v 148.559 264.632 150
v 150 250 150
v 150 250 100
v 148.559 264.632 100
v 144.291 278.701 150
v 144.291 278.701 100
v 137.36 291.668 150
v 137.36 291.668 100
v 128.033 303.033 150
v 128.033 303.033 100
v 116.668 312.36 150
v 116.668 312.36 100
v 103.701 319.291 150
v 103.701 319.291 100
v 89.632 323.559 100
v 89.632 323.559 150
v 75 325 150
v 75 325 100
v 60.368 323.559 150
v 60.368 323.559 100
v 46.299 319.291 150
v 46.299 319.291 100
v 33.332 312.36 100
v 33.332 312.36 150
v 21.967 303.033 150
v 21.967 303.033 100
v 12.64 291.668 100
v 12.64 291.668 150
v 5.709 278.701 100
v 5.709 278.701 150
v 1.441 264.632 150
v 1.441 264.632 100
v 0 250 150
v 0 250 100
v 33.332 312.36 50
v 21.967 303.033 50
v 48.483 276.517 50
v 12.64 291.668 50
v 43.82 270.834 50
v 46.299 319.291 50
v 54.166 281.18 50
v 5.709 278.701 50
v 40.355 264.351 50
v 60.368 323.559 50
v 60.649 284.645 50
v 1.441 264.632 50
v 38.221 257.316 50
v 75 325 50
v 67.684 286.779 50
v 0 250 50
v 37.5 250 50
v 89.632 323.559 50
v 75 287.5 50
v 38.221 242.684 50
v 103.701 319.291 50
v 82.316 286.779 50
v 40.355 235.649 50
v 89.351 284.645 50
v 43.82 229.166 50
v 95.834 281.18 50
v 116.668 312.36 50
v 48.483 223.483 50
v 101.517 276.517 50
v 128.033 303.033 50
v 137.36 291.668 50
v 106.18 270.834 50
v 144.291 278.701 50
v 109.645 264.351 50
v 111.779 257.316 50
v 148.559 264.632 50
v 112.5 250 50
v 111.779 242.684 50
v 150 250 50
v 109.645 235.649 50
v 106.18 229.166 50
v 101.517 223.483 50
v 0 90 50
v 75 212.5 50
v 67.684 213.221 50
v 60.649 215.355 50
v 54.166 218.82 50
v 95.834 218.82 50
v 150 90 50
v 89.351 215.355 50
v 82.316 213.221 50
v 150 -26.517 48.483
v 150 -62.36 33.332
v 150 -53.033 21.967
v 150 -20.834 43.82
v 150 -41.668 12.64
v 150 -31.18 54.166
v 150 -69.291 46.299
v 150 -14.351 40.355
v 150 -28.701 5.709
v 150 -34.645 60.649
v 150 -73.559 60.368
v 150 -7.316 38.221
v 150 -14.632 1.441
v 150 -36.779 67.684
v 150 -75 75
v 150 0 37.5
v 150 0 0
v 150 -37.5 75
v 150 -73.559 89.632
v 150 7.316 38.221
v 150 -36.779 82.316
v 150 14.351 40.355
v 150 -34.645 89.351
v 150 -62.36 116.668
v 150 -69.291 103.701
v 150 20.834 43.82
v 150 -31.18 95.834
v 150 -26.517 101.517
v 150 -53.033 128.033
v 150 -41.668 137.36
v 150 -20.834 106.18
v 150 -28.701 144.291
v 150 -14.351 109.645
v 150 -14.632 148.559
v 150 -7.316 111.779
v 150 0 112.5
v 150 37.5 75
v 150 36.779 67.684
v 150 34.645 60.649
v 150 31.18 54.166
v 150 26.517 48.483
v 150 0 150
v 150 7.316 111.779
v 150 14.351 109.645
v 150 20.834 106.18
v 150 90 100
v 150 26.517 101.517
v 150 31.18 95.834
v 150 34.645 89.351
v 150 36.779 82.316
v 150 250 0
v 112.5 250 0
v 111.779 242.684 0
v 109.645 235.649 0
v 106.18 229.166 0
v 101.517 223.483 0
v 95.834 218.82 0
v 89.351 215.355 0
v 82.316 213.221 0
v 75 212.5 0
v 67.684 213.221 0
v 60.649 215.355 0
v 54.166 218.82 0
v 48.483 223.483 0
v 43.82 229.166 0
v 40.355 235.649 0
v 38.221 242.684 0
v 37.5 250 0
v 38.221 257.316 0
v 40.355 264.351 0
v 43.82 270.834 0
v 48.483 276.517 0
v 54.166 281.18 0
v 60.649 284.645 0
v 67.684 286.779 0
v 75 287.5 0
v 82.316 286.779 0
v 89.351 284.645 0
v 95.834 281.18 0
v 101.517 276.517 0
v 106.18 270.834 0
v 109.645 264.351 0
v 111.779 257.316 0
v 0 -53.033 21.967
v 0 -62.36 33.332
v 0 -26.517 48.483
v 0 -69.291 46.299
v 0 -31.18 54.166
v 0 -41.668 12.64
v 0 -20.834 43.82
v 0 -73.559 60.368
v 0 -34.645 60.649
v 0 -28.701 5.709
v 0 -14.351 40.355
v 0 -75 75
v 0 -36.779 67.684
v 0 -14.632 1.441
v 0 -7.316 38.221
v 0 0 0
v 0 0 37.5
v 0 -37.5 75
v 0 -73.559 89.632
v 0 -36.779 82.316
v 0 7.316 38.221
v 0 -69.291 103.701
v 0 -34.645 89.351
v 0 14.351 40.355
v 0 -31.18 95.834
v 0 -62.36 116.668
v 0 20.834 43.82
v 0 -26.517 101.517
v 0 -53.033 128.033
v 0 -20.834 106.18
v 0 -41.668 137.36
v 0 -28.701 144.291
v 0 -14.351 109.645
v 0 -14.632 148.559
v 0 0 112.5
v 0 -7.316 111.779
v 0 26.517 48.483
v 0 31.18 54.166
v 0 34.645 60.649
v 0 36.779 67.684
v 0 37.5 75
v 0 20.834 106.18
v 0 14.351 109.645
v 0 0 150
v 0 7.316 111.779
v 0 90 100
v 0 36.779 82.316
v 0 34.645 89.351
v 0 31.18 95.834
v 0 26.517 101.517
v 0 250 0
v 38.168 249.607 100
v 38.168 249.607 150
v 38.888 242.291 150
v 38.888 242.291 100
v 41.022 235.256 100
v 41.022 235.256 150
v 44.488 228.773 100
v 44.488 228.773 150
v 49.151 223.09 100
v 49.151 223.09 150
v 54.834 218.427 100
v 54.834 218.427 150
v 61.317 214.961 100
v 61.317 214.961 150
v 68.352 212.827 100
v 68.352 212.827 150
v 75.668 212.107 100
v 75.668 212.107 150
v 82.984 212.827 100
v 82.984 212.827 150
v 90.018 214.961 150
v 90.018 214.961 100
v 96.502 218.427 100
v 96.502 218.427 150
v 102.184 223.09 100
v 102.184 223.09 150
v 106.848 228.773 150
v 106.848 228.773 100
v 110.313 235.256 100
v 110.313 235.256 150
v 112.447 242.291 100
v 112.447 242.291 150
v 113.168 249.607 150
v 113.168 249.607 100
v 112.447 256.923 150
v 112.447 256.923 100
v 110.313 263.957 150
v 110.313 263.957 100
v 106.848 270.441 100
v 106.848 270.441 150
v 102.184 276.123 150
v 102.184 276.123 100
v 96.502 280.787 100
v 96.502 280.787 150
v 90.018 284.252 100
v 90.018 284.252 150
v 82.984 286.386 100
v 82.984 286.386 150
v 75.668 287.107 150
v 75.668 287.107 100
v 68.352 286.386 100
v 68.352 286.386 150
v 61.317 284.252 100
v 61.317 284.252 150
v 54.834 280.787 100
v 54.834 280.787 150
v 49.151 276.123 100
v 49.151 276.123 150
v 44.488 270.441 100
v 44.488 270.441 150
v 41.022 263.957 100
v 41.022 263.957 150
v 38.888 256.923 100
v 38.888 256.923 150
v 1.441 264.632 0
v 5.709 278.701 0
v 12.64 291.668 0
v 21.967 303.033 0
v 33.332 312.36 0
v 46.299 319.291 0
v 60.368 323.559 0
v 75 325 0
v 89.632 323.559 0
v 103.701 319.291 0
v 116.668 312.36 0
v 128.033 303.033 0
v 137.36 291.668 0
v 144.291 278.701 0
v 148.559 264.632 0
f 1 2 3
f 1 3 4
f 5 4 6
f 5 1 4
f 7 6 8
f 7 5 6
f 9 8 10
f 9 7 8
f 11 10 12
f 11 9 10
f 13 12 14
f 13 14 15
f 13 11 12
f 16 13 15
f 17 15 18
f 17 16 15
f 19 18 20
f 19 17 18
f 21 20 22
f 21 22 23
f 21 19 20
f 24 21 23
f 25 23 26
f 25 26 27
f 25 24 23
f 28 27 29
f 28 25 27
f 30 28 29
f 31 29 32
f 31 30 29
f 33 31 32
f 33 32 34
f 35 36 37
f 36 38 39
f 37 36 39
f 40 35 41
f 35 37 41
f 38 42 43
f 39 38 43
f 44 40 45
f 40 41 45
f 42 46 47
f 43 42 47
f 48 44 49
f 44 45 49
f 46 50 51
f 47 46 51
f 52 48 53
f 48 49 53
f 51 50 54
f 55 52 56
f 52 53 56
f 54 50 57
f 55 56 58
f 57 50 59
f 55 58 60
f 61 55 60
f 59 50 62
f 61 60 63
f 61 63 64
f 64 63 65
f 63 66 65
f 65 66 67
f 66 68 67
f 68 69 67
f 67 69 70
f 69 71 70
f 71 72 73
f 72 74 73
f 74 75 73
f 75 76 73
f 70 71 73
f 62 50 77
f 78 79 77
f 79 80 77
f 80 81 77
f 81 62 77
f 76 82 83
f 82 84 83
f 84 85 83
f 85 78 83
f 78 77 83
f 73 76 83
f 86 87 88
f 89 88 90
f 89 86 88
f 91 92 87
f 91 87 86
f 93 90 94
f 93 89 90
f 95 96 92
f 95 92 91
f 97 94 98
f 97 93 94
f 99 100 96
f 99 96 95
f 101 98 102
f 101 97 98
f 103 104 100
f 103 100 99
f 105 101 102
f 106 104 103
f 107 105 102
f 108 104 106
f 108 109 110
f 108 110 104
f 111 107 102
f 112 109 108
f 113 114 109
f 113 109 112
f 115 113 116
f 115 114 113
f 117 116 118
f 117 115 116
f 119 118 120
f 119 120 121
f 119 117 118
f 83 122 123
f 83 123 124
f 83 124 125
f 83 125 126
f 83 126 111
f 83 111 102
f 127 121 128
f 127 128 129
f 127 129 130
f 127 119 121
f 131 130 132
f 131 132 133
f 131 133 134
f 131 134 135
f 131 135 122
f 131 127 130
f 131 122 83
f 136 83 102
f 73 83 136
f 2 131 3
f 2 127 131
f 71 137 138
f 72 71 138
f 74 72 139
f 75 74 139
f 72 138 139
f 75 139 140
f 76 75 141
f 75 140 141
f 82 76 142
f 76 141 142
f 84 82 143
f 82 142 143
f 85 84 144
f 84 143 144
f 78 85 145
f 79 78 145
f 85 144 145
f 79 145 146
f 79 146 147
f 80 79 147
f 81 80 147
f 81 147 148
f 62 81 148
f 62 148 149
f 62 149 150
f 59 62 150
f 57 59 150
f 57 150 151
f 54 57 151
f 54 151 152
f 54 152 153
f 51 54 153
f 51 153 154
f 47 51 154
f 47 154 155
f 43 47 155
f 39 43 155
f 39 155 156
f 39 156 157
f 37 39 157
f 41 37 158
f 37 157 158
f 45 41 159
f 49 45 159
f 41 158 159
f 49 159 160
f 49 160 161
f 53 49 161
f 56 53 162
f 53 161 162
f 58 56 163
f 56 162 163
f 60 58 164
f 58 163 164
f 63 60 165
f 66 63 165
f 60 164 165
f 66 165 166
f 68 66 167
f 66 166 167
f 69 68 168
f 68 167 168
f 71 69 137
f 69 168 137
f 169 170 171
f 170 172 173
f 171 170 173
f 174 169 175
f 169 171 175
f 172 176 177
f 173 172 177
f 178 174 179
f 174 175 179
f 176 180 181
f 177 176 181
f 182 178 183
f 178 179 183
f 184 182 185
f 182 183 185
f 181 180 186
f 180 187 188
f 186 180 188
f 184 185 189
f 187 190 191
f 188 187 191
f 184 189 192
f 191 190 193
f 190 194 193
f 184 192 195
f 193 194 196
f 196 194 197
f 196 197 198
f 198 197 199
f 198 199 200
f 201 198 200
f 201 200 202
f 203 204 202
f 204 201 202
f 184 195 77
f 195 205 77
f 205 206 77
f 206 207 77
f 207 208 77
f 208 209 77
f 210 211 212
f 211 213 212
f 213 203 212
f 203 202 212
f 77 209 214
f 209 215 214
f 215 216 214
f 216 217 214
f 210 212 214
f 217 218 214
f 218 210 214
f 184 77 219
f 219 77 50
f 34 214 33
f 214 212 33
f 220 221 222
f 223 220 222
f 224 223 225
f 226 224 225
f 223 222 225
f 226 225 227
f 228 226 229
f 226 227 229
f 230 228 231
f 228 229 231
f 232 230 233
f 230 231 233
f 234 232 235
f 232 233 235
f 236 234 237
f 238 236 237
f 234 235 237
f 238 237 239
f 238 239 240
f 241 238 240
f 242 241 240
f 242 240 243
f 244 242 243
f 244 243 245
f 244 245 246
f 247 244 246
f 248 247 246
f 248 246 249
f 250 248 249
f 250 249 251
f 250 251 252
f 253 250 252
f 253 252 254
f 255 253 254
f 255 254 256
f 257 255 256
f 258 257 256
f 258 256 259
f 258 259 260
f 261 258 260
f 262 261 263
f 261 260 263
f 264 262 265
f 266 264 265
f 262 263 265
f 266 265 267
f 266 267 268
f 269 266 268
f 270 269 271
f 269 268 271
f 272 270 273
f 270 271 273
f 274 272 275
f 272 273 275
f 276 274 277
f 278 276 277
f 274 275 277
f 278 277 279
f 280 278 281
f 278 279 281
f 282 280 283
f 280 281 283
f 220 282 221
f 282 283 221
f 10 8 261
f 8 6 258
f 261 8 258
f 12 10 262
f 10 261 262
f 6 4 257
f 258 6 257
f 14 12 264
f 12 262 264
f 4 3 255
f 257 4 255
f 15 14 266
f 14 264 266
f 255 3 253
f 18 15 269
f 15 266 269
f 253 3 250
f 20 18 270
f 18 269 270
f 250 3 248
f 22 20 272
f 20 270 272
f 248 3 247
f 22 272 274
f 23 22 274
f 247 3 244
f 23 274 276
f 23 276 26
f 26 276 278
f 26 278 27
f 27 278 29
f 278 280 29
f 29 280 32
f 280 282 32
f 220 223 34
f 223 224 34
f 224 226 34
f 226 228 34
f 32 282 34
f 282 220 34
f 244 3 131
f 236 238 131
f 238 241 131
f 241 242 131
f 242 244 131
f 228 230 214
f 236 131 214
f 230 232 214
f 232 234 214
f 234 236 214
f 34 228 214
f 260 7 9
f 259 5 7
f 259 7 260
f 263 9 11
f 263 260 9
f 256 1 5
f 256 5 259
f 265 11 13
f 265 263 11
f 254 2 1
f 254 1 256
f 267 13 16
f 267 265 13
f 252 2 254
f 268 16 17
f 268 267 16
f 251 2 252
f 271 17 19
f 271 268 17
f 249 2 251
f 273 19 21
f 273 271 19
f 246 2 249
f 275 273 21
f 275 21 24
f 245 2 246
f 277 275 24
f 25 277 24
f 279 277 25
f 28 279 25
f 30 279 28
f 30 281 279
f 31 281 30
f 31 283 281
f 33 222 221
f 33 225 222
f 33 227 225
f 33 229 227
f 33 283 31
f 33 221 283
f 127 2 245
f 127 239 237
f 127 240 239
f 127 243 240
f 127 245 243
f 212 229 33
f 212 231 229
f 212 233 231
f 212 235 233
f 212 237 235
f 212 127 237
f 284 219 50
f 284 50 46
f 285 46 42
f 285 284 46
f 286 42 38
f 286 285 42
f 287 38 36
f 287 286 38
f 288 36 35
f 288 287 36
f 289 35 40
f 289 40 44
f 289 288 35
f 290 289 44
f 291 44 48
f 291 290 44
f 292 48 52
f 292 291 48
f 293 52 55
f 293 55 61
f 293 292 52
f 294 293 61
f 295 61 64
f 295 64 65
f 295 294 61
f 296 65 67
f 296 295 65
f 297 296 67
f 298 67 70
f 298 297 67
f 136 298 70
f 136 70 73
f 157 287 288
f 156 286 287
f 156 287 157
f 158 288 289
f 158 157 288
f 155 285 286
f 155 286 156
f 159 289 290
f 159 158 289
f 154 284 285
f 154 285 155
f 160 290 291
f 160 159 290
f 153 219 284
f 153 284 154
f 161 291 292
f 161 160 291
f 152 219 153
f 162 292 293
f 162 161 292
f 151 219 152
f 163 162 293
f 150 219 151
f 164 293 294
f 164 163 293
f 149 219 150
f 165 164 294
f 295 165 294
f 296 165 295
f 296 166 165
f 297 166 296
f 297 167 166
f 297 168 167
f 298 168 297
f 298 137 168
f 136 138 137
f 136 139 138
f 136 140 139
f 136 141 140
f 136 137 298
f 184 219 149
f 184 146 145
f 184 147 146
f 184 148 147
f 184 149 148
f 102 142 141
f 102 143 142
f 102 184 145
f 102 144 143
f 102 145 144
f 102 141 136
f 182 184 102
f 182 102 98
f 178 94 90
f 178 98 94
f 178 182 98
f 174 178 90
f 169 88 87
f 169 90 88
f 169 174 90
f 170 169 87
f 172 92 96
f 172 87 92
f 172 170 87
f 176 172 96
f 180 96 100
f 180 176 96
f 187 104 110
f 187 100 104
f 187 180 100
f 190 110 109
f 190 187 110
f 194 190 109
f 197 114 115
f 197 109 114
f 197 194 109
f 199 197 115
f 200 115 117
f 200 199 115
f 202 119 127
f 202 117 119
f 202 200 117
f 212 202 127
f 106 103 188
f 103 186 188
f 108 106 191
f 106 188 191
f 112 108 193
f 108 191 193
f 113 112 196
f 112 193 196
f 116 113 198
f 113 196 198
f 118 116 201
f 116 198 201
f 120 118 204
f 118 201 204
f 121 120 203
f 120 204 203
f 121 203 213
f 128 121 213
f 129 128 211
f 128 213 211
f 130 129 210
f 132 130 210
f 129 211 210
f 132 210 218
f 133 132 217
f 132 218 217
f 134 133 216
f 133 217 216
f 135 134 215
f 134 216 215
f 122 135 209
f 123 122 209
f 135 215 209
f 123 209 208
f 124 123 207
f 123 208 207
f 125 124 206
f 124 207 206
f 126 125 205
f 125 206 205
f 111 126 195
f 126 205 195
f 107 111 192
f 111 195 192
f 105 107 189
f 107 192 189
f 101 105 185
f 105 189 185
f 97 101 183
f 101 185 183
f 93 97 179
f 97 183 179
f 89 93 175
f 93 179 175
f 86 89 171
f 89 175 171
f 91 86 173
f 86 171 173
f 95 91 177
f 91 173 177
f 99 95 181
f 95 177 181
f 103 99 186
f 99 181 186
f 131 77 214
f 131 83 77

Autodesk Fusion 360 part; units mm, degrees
sketch "Sketch1" plane through (0, 0, 0) normal (1, 0, 0) x (0, 1, 0)
  line L0 (0, 0) -> (250, 0)
  line L1 (250, 0) -> (250, 150)
  line L2 (250, 150) -> (0, 150)
  line L3 (0, 150) -> (0, 0)
  circle A0 centre (0, 75) radius 75
  dimension "d1" = 250
  dimension "d2" = 150
sketch "Sketch2" plane through (0, 0, 0) normal (1, 0, 0) x (0, 1, 0)
extrude "Extrude1" add sketch "Sketch1" along normal blind 150
sketch "Sketch3" plane through (0, 0, 0) normal (-1, 0, 0) x (0, -1, 0)
  line L0 (0, 150) -> (-250, 150)
  line L1 (-250, 150) -> (-250, 0)
  line L2 (-250, 0) -> (0, 0)
  arc A0 (0, 0) -> (0, 150) centre (0, 75) ccw
  line L3 (0, 150) -> (0, 0)
  circle A1 centre (0, 75) radius 37.5
  dimension "d5" = 75
extrude "Extrude2" cut sketch "Sketch3" against normal blind 150 contours L3 A1 | L3 A1
sketch "Sketch4" plane through (150, 0, 0) normal (1, 0, 0) x (0, 1, 0)
  circle A0 centre (0, 75) radius 37.5
  line L0 (250, 150) -> (0, 150)
  arc A1 (0, 150) -> (0, 0) centre (0, 75) ccw
  line L1 (0, 0) -> (250, 0)
  line L2 (250, 0) -> (250, 150)
  line L3 (250, 150) -> (250, 0) construction
  line L4 (250, 75) -> (90, 75) construction
  line L5 (90, 75) -> (90, 100)
  line L6 (90, 75) -> (90, 50)
  line L7 (90, 100) -> (250, 100)
  line L8 (250, 50) -> (90, 50)
  dimension "d8" = 25
  dimension "d9" = 25
extrude "Extrude3" cut sketch "Sketch4" against normal blind 150 contours L2 L5 L6 L7 L8
sketch "Sketch5" plane through (0, 0, 0) normal (0, 0, -1) x (1, 0, 0)
  line L0 (0, 0) -> (0, -250)
  line L1 (0, -250) -> (150, -250)
  line L2 (150, -250) -> (150, 0)
  line L3 (150, 0) -> (0, 0)
  line L4 (0, -250) -> (150, -250) construction
  circle A0 centre (75, -250) radius 75
  dimension "d12" = 150
extrude "Extrude4" add sketch "Sketch5" against normal blind 50 contours L1 A0 picked at (76.8683, -274.9301)
sketch "Sketch6" plane through (0, 0, 0) normal (1, 0, 0) x (0, 1, 0)
  line L0 (220, 110) -> (210, 110)
  line L1 (250, 150) -> (250, 20) construction
sketch "Sketch7" plane through (0, 0, 150) normal (0, 0, 1) x (-1, 0, 0)
  line L0 (0, -250) -> (0, 0)
  line L1 (0, 0) -> (-150, 0)
  line L2 (-150, 0) -> (-150, -250)
  line L3 (-150, -250) -> (0, -250)
  circle A0 centre (-75, -250) radius 75
  dimension "d15" = 150
extrude "Extrude5" add sketch "Sketch7" against normal blind 50 contours L3 A0 picked at (-76.8683, -274.9301)
sketch "Sketch8" plane through (0, 0, 150) normal (0, 0, 1) x (-1, 0, 0)
  line L0 (0, -250) -> (0, 0)
  line L1 (0, 0) -> (-150, 0)
  line L2 (-150, 0) -> (-150, -250)
  arc A0 (-150, -250) -> (0, -250) centre (-75, -250) ccw
  circle A1 centre (-75.6677, -249.6068) radius 37.5
  dimension "d18" = 75
extrude "Extrude6" cut sketch "Sketch8" against normal blind 50 contours A1
sketch "Sketch9" plane through (0, 0, 0) normal (0, 0, -1) x (1, 0, 0)
  line L0 (0, 0) -> (0, -250)
  arc A0 (0, -250) -> (150, -250) centre (75, -250) ccw
  line L1 (150, -250) -> (150, 0)
  line L2 (150, 0) -> (0, 0)
  circle A1 centre (75, -250) radius 37.5
  line L3 (0, -250) -> (150, -250) construction
  dimension "d21" = 75
extrude "Extrude7" cut sketch "Sketch9" against normal blind 50 contours A1
